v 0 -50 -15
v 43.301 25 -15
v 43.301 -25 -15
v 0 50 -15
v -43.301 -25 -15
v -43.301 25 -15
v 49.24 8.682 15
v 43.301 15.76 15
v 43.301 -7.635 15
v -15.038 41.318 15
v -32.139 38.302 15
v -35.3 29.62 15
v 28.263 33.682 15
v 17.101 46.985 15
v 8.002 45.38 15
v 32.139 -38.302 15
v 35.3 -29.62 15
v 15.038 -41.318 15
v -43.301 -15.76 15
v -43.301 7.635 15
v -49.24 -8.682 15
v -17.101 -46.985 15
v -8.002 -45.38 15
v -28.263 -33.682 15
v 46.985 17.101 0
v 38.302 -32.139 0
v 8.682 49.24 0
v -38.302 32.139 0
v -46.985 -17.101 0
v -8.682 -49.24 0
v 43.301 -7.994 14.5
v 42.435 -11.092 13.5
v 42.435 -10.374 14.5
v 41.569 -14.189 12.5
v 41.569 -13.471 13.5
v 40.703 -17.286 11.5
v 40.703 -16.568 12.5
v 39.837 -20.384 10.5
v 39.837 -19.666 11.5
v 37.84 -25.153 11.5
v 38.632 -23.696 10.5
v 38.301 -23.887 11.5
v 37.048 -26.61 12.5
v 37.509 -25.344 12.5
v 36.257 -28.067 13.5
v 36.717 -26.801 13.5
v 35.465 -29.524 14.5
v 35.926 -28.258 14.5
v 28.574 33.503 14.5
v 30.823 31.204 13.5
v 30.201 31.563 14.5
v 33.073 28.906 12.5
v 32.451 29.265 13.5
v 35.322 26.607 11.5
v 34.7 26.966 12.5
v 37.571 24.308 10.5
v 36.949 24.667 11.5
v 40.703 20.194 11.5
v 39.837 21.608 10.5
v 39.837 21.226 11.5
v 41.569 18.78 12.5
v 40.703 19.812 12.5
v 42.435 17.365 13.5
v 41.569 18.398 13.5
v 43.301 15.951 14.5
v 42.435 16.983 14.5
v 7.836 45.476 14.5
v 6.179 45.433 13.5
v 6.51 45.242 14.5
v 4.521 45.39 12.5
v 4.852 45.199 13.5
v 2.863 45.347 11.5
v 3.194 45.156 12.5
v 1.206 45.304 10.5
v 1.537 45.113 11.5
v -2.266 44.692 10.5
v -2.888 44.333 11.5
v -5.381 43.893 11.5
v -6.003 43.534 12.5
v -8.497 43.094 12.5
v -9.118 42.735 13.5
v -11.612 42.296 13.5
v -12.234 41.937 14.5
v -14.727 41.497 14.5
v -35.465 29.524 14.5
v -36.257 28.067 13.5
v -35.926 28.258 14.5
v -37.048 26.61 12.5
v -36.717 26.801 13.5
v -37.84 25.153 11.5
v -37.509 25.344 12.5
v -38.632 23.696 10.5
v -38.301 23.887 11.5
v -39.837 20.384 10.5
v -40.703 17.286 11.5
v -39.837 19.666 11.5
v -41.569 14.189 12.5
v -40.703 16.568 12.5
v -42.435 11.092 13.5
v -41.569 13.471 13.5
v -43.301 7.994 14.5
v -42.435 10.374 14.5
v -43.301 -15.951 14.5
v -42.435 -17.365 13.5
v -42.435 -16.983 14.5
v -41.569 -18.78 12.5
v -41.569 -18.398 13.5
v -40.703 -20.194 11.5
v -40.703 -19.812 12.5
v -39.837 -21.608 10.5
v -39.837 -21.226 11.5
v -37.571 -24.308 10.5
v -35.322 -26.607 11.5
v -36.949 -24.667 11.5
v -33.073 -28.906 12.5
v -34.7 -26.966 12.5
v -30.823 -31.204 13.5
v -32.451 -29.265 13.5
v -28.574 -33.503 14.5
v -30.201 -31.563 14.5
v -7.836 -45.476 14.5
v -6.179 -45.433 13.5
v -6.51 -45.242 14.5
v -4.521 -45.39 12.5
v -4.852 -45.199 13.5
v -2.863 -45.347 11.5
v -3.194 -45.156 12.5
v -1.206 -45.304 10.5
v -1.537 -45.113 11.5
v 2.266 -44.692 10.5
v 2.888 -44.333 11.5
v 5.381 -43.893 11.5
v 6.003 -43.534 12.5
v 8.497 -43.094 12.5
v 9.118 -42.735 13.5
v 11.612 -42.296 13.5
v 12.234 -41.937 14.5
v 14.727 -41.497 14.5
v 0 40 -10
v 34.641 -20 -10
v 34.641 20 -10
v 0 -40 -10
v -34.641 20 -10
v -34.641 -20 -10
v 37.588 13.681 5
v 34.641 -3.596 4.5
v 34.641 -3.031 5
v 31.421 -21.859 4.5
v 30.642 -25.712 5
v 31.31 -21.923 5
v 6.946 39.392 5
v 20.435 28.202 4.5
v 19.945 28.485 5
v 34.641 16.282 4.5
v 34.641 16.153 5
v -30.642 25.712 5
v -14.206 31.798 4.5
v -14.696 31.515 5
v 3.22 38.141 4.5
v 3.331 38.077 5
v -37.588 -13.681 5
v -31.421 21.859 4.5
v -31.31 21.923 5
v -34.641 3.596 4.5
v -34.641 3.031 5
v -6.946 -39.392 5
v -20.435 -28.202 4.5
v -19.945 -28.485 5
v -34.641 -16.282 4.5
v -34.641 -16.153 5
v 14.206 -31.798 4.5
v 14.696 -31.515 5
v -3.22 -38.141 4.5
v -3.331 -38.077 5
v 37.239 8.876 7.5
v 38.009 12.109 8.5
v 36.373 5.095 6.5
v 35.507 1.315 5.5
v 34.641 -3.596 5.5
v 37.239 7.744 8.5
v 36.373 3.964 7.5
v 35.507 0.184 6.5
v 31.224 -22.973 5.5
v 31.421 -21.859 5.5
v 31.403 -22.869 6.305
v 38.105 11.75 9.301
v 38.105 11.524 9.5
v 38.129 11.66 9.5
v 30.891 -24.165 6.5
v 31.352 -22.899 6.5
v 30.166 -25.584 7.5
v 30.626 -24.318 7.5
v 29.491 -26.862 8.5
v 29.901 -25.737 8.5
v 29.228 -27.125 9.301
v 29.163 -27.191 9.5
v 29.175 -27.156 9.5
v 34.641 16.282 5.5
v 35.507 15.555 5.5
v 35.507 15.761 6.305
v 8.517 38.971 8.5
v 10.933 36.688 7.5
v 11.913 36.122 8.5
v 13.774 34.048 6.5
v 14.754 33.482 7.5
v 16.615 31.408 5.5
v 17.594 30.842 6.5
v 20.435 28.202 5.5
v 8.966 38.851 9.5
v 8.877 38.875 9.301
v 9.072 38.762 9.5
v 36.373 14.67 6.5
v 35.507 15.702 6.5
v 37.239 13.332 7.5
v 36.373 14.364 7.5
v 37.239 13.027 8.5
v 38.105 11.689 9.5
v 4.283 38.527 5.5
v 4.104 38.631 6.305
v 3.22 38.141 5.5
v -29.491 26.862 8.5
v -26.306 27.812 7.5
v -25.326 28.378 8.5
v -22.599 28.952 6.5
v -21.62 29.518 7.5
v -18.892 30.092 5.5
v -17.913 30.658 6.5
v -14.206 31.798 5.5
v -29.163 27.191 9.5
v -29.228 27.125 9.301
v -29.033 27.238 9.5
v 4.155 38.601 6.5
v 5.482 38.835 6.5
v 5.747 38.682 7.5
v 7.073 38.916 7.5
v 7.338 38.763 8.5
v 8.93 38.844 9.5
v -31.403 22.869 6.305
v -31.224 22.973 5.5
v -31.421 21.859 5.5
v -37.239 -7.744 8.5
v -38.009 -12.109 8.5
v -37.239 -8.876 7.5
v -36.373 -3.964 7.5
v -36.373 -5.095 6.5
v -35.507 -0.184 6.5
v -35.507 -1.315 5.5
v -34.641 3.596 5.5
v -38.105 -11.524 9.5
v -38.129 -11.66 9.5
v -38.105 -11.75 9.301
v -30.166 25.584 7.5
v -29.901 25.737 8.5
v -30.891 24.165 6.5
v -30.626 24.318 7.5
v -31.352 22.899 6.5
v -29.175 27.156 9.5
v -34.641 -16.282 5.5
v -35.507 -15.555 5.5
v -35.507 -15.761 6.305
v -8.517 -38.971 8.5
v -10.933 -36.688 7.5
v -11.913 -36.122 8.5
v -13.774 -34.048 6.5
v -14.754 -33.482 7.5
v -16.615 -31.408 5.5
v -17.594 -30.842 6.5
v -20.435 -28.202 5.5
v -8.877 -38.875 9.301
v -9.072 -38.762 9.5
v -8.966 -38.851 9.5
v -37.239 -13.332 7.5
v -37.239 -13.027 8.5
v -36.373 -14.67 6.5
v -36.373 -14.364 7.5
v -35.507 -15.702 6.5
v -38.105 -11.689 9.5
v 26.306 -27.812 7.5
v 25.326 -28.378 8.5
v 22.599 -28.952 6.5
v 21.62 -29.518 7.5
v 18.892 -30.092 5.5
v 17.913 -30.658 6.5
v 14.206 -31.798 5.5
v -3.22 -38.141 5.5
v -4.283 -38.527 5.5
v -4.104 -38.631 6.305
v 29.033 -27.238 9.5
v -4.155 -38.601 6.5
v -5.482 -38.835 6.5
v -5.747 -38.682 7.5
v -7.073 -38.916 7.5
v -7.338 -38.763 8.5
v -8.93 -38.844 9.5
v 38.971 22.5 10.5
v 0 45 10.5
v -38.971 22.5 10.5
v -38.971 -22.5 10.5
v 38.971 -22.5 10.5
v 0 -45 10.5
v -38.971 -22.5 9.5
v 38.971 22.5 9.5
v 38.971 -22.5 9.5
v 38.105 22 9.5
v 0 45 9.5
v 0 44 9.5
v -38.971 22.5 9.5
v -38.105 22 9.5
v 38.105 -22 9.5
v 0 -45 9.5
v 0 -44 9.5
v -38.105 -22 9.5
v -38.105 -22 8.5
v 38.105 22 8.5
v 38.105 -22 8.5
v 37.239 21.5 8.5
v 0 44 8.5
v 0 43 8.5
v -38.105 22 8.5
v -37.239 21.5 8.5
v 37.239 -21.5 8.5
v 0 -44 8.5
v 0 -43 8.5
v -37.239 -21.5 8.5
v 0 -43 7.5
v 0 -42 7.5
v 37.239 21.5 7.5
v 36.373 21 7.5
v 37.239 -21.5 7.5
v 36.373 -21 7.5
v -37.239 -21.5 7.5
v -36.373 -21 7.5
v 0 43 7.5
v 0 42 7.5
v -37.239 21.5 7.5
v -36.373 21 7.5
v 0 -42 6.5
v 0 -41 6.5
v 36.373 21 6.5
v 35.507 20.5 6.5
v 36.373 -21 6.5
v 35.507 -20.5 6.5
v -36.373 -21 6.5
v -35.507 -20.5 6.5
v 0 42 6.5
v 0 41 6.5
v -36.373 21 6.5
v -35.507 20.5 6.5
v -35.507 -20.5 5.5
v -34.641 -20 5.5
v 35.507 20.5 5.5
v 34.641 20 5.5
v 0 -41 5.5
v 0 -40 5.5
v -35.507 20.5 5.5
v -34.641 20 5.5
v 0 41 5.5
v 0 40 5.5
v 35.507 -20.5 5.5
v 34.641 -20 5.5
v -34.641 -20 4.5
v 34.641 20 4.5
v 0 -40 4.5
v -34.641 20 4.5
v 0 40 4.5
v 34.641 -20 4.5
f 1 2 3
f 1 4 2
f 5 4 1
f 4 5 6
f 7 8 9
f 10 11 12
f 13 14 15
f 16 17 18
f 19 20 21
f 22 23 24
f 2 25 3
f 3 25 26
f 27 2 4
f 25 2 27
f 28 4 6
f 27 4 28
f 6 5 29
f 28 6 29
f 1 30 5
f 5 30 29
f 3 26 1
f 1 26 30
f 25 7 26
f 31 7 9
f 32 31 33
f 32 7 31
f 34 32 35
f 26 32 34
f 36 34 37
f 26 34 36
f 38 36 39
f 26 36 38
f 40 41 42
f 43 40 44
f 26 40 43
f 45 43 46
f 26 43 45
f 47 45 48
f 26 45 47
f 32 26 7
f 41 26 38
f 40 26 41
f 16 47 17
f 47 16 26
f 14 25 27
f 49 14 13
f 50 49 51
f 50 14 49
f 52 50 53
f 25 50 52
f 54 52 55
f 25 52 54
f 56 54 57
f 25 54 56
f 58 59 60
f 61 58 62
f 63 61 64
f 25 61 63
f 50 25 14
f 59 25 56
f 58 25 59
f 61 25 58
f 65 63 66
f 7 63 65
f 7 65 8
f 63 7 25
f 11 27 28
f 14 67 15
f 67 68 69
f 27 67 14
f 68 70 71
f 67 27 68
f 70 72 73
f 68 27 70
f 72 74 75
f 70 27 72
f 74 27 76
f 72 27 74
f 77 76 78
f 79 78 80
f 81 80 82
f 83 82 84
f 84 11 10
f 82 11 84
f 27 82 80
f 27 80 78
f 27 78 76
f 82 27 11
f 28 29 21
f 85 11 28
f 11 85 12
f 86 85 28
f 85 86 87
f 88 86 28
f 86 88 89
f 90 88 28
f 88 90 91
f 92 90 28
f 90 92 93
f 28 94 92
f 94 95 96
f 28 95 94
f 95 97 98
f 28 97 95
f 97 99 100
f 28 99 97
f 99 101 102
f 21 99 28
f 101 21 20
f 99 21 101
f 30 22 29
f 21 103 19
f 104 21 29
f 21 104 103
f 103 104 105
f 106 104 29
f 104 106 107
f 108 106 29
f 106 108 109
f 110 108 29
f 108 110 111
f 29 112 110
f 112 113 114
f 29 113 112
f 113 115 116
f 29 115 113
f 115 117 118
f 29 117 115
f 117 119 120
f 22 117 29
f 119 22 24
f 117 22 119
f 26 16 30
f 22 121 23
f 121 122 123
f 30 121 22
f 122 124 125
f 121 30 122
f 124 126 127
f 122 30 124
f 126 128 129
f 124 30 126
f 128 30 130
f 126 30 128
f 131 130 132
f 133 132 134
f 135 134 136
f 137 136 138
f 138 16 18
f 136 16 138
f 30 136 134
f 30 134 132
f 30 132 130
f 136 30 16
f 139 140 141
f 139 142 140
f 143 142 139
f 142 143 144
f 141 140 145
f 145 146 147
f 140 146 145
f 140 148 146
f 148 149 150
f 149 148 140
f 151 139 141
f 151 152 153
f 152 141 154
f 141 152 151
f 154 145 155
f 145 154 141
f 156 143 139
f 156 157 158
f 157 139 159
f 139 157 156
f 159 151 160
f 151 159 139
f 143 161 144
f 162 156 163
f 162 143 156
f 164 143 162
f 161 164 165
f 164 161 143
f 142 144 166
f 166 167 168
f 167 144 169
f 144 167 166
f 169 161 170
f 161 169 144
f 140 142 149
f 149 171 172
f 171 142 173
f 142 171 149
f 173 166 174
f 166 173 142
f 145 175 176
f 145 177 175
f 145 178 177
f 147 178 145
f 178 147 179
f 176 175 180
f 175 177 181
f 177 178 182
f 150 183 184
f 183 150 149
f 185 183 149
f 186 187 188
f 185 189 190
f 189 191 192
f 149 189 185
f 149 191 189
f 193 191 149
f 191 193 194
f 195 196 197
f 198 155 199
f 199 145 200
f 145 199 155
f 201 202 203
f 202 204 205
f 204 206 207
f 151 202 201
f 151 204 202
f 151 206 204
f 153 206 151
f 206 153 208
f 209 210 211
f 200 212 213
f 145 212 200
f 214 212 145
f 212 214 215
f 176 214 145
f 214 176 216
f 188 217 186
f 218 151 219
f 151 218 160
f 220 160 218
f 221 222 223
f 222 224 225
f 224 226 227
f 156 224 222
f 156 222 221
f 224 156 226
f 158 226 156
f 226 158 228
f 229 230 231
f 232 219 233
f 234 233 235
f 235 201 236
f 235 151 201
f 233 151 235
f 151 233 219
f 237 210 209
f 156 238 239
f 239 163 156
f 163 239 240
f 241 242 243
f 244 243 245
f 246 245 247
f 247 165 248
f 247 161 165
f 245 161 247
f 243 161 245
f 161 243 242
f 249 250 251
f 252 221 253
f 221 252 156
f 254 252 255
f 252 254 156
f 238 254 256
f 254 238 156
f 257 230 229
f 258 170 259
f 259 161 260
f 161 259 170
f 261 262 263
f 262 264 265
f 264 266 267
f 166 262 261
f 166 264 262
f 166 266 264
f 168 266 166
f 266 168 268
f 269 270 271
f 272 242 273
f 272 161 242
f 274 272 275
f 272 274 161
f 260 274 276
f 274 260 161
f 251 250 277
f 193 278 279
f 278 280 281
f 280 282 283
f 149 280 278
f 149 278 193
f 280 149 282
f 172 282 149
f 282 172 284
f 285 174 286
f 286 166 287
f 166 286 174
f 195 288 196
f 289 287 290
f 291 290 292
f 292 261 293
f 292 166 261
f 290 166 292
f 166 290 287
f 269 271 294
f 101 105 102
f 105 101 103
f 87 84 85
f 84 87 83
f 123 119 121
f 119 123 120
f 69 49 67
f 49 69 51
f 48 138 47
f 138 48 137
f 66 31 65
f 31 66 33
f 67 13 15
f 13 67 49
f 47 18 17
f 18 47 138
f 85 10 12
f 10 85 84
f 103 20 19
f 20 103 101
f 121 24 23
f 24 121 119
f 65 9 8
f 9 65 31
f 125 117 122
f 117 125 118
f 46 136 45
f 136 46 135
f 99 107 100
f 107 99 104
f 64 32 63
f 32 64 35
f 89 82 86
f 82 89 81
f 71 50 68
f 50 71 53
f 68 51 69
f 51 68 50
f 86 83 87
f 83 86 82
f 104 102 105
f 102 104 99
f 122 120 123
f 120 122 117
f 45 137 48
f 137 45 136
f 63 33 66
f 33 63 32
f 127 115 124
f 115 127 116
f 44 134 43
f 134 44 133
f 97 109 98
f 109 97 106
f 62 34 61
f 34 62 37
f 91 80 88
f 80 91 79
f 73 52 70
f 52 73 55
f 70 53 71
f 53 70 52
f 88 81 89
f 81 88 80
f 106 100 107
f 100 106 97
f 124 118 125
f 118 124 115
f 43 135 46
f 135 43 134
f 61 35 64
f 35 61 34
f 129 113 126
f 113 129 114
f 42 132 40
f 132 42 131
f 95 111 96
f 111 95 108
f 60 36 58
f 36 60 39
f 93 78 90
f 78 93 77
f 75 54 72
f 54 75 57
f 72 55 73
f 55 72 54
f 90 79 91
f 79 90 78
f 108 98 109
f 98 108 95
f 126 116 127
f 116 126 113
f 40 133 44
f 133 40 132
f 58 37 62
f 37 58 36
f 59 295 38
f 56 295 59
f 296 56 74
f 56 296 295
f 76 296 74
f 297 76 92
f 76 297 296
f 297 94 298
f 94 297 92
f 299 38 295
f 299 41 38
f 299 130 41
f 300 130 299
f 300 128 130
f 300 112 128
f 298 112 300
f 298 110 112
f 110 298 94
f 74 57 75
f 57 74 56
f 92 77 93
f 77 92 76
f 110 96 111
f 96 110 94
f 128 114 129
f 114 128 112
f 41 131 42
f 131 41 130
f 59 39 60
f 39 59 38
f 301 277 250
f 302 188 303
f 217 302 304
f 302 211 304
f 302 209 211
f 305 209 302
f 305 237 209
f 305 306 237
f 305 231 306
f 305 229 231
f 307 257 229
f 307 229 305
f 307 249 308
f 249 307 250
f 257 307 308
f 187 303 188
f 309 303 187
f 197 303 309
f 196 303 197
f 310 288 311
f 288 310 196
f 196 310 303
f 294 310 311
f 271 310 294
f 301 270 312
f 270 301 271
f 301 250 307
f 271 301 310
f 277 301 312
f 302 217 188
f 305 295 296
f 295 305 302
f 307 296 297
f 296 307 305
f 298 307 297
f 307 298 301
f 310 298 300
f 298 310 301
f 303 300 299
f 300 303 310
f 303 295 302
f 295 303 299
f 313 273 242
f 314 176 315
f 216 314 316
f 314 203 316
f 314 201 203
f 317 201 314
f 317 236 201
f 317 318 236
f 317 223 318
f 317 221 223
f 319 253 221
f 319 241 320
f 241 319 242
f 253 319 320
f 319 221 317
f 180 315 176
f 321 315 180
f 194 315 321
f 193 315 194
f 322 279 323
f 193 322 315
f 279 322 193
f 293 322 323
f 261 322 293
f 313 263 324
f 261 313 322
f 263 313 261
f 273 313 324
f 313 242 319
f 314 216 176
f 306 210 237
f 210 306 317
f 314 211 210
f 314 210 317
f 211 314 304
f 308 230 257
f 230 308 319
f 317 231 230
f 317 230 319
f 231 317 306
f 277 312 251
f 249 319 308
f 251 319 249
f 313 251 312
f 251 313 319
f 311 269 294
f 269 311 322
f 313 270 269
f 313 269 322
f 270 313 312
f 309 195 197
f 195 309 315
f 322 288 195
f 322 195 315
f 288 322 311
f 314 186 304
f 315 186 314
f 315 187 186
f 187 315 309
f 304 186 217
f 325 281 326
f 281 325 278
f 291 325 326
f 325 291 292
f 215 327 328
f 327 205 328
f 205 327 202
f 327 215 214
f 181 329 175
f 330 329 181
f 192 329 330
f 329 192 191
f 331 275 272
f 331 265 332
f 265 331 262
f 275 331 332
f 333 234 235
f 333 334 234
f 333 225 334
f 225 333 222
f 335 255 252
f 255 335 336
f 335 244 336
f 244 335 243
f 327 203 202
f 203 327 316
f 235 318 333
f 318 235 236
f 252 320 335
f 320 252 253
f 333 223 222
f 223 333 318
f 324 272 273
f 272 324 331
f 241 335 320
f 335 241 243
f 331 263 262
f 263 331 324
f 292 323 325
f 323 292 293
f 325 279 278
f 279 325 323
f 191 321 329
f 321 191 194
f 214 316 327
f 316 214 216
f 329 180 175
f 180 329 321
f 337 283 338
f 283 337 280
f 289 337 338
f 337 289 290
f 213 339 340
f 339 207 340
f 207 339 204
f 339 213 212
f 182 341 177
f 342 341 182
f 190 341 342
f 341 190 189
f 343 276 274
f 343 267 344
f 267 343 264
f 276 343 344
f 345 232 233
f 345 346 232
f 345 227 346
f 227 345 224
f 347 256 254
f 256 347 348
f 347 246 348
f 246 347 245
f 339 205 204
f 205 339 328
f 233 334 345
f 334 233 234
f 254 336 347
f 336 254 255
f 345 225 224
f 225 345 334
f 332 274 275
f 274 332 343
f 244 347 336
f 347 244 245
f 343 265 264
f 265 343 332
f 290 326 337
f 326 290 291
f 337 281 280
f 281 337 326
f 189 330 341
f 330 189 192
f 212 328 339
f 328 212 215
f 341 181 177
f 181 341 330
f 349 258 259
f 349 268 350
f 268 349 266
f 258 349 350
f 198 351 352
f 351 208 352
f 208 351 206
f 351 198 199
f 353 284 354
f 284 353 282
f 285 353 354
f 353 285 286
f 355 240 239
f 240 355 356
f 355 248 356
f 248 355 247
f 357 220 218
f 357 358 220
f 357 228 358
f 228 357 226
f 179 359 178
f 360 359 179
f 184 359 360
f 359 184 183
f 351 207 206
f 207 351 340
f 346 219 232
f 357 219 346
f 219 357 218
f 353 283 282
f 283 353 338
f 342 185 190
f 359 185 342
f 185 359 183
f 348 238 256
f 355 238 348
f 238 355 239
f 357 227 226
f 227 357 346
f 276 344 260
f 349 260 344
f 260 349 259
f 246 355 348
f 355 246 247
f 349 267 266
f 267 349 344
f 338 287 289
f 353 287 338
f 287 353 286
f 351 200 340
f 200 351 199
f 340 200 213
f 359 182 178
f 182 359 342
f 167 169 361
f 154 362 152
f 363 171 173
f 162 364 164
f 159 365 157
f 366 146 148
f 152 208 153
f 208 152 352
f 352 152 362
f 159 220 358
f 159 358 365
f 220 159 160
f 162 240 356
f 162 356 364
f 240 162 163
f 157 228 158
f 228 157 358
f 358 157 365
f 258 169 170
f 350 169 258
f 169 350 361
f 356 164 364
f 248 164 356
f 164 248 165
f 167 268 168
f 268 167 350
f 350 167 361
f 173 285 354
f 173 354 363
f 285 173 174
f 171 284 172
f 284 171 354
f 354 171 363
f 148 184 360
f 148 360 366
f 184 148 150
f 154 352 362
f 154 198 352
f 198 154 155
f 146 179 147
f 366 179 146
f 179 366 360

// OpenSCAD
module polygon3d(r=20, h=10, twist=0) {
    n = 6;
    points = [ for (d = [0 : 360/n : 360-1]) [ r*sin(d), r*cos(d) ] ];
    linear_extrude(height = h, center = true, convexity = 10, twist = twist)
    polygon(points=points);
}

module box3d(r=50, h=40, wall_thickness=10) {
    difference() {
        polygon3d(r, h, twist=20);
        translate([0, 0, wall_thickness/2]) polygon3d(r-wall_thickness, h, twist=20);
    }
        
    
}

module halfd20(side=10) {
    points = [ for (d = [0 : 360/n : 360-1]) [ r*sin(d), r*cos(d), 0 ] ];
}


RADIUS = 50;
HEIGHT = 30;

union() {
    difference() {
        box3d(r=RADIUS, h=HEIGHT);  
        for(i = [0:10]) {
             translate([0, 0, HEIGHT/2-i]) polygon3d(RADIUS-i, 1, twist=0);
         }
     }

    for(i = [0:10]) {
         *translate([0, 0, HEIGHT/2-10-i]) polygon3d(RADIUS+i, 1, twist=0);
    }
 }
